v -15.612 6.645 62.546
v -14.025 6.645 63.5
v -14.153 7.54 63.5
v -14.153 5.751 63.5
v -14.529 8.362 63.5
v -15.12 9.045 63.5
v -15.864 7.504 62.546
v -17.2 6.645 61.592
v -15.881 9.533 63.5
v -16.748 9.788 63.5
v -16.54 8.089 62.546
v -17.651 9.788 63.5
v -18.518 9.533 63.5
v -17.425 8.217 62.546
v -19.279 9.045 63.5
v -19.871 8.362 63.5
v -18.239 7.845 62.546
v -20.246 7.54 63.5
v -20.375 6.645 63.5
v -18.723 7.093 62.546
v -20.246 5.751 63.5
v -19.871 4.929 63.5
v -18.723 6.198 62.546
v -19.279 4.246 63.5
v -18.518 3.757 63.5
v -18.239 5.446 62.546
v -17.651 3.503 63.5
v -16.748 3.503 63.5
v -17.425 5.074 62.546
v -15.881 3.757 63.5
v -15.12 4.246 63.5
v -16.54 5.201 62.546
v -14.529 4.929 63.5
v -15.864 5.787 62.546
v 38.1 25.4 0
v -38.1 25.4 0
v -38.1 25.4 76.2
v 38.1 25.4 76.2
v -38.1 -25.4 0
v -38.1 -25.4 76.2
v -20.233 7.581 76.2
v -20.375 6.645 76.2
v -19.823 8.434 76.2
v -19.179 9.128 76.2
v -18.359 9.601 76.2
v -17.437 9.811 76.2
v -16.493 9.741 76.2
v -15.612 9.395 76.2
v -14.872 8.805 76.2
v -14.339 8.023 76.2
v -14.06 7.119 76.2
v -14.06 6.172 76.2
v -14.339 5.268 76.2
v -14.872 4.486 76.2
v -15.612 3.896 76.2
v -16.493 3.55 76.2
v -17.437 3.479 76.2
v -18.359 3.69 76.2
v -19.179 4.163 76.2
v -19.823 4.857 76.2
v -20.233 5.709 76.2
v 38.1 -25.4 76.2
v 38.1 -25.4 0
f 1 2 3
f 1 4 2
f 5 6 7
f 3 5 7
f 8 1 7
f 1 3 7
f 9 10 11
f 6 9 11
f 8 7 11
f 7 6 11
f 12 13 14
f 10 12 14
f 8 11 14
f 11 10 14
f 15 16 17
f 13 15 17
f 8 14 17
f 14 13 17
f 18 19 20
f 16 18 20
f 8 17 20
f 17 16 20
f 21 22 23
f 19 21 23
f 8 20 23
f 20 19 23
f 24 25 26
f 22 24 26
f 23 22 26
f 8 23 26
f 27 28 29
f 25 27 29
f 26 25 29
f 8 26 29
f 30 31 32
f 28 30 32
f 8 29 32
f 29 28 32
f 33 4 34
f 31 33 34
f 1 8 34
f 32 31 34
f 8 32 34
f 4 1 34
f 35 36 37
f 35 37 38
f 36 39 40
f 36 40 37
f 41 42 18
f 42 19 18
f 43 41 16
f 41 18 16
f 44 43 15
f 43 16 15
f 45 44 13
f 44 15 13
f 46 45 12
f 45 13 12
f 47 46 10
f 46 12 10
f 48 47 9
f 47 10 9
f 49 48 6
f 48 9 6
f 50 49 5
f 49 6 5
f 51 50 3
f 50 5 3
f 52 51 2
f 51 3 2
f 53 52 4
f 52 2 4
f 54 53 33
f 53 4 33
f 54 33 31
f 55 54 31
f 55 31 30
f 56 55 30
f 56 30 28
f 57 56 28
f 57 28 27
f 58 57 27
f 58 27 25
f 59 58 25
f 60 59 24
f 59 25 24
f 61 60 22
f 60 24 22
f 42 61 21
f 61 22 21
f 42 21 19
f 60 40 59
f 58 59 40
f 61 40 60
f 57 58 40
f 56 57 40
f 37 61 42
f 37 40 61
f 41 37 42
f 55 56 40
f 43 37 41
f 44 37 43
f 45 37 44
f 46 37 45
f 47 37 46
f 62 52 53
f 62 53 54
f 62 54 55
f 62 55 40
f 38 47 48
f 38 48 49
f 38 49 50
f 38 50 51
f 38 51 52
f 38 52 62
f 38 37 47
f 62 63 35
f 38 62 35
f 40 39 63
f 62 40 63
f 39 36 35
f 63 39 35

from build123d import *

# Parameters (mm, degrees)
F0_W     = 76.2
F0_H     = 50.8
F1_DEPTH = 76.2
F3_D     = 6.35
F3_DEPTH = 12.7
F3_TIP   = 1.9077324654


with BuildPart() as f1:
    # F0 (on Top) → F1 (new body)
    with BuildSketch(Plane.XY):
        Rectangle(F0_W, F0_H)
    extrude(amount=F1_DEPTH)

    # F3
    with Locations(Plane.XY.offset(76.2)):
        with Locations((-17.1995405108, 6.6453265026)):
            Hole(F3_D / 2, depth=F3_DEPTH)
            with Locations((0, 0, -(F3_DEPTH + F3_TIP / 2))):  # 118° drill point
                Cone(0, F3_D / 2, F3_TIP, mode=Mode.SUBTRACT)


solid = f1.part
